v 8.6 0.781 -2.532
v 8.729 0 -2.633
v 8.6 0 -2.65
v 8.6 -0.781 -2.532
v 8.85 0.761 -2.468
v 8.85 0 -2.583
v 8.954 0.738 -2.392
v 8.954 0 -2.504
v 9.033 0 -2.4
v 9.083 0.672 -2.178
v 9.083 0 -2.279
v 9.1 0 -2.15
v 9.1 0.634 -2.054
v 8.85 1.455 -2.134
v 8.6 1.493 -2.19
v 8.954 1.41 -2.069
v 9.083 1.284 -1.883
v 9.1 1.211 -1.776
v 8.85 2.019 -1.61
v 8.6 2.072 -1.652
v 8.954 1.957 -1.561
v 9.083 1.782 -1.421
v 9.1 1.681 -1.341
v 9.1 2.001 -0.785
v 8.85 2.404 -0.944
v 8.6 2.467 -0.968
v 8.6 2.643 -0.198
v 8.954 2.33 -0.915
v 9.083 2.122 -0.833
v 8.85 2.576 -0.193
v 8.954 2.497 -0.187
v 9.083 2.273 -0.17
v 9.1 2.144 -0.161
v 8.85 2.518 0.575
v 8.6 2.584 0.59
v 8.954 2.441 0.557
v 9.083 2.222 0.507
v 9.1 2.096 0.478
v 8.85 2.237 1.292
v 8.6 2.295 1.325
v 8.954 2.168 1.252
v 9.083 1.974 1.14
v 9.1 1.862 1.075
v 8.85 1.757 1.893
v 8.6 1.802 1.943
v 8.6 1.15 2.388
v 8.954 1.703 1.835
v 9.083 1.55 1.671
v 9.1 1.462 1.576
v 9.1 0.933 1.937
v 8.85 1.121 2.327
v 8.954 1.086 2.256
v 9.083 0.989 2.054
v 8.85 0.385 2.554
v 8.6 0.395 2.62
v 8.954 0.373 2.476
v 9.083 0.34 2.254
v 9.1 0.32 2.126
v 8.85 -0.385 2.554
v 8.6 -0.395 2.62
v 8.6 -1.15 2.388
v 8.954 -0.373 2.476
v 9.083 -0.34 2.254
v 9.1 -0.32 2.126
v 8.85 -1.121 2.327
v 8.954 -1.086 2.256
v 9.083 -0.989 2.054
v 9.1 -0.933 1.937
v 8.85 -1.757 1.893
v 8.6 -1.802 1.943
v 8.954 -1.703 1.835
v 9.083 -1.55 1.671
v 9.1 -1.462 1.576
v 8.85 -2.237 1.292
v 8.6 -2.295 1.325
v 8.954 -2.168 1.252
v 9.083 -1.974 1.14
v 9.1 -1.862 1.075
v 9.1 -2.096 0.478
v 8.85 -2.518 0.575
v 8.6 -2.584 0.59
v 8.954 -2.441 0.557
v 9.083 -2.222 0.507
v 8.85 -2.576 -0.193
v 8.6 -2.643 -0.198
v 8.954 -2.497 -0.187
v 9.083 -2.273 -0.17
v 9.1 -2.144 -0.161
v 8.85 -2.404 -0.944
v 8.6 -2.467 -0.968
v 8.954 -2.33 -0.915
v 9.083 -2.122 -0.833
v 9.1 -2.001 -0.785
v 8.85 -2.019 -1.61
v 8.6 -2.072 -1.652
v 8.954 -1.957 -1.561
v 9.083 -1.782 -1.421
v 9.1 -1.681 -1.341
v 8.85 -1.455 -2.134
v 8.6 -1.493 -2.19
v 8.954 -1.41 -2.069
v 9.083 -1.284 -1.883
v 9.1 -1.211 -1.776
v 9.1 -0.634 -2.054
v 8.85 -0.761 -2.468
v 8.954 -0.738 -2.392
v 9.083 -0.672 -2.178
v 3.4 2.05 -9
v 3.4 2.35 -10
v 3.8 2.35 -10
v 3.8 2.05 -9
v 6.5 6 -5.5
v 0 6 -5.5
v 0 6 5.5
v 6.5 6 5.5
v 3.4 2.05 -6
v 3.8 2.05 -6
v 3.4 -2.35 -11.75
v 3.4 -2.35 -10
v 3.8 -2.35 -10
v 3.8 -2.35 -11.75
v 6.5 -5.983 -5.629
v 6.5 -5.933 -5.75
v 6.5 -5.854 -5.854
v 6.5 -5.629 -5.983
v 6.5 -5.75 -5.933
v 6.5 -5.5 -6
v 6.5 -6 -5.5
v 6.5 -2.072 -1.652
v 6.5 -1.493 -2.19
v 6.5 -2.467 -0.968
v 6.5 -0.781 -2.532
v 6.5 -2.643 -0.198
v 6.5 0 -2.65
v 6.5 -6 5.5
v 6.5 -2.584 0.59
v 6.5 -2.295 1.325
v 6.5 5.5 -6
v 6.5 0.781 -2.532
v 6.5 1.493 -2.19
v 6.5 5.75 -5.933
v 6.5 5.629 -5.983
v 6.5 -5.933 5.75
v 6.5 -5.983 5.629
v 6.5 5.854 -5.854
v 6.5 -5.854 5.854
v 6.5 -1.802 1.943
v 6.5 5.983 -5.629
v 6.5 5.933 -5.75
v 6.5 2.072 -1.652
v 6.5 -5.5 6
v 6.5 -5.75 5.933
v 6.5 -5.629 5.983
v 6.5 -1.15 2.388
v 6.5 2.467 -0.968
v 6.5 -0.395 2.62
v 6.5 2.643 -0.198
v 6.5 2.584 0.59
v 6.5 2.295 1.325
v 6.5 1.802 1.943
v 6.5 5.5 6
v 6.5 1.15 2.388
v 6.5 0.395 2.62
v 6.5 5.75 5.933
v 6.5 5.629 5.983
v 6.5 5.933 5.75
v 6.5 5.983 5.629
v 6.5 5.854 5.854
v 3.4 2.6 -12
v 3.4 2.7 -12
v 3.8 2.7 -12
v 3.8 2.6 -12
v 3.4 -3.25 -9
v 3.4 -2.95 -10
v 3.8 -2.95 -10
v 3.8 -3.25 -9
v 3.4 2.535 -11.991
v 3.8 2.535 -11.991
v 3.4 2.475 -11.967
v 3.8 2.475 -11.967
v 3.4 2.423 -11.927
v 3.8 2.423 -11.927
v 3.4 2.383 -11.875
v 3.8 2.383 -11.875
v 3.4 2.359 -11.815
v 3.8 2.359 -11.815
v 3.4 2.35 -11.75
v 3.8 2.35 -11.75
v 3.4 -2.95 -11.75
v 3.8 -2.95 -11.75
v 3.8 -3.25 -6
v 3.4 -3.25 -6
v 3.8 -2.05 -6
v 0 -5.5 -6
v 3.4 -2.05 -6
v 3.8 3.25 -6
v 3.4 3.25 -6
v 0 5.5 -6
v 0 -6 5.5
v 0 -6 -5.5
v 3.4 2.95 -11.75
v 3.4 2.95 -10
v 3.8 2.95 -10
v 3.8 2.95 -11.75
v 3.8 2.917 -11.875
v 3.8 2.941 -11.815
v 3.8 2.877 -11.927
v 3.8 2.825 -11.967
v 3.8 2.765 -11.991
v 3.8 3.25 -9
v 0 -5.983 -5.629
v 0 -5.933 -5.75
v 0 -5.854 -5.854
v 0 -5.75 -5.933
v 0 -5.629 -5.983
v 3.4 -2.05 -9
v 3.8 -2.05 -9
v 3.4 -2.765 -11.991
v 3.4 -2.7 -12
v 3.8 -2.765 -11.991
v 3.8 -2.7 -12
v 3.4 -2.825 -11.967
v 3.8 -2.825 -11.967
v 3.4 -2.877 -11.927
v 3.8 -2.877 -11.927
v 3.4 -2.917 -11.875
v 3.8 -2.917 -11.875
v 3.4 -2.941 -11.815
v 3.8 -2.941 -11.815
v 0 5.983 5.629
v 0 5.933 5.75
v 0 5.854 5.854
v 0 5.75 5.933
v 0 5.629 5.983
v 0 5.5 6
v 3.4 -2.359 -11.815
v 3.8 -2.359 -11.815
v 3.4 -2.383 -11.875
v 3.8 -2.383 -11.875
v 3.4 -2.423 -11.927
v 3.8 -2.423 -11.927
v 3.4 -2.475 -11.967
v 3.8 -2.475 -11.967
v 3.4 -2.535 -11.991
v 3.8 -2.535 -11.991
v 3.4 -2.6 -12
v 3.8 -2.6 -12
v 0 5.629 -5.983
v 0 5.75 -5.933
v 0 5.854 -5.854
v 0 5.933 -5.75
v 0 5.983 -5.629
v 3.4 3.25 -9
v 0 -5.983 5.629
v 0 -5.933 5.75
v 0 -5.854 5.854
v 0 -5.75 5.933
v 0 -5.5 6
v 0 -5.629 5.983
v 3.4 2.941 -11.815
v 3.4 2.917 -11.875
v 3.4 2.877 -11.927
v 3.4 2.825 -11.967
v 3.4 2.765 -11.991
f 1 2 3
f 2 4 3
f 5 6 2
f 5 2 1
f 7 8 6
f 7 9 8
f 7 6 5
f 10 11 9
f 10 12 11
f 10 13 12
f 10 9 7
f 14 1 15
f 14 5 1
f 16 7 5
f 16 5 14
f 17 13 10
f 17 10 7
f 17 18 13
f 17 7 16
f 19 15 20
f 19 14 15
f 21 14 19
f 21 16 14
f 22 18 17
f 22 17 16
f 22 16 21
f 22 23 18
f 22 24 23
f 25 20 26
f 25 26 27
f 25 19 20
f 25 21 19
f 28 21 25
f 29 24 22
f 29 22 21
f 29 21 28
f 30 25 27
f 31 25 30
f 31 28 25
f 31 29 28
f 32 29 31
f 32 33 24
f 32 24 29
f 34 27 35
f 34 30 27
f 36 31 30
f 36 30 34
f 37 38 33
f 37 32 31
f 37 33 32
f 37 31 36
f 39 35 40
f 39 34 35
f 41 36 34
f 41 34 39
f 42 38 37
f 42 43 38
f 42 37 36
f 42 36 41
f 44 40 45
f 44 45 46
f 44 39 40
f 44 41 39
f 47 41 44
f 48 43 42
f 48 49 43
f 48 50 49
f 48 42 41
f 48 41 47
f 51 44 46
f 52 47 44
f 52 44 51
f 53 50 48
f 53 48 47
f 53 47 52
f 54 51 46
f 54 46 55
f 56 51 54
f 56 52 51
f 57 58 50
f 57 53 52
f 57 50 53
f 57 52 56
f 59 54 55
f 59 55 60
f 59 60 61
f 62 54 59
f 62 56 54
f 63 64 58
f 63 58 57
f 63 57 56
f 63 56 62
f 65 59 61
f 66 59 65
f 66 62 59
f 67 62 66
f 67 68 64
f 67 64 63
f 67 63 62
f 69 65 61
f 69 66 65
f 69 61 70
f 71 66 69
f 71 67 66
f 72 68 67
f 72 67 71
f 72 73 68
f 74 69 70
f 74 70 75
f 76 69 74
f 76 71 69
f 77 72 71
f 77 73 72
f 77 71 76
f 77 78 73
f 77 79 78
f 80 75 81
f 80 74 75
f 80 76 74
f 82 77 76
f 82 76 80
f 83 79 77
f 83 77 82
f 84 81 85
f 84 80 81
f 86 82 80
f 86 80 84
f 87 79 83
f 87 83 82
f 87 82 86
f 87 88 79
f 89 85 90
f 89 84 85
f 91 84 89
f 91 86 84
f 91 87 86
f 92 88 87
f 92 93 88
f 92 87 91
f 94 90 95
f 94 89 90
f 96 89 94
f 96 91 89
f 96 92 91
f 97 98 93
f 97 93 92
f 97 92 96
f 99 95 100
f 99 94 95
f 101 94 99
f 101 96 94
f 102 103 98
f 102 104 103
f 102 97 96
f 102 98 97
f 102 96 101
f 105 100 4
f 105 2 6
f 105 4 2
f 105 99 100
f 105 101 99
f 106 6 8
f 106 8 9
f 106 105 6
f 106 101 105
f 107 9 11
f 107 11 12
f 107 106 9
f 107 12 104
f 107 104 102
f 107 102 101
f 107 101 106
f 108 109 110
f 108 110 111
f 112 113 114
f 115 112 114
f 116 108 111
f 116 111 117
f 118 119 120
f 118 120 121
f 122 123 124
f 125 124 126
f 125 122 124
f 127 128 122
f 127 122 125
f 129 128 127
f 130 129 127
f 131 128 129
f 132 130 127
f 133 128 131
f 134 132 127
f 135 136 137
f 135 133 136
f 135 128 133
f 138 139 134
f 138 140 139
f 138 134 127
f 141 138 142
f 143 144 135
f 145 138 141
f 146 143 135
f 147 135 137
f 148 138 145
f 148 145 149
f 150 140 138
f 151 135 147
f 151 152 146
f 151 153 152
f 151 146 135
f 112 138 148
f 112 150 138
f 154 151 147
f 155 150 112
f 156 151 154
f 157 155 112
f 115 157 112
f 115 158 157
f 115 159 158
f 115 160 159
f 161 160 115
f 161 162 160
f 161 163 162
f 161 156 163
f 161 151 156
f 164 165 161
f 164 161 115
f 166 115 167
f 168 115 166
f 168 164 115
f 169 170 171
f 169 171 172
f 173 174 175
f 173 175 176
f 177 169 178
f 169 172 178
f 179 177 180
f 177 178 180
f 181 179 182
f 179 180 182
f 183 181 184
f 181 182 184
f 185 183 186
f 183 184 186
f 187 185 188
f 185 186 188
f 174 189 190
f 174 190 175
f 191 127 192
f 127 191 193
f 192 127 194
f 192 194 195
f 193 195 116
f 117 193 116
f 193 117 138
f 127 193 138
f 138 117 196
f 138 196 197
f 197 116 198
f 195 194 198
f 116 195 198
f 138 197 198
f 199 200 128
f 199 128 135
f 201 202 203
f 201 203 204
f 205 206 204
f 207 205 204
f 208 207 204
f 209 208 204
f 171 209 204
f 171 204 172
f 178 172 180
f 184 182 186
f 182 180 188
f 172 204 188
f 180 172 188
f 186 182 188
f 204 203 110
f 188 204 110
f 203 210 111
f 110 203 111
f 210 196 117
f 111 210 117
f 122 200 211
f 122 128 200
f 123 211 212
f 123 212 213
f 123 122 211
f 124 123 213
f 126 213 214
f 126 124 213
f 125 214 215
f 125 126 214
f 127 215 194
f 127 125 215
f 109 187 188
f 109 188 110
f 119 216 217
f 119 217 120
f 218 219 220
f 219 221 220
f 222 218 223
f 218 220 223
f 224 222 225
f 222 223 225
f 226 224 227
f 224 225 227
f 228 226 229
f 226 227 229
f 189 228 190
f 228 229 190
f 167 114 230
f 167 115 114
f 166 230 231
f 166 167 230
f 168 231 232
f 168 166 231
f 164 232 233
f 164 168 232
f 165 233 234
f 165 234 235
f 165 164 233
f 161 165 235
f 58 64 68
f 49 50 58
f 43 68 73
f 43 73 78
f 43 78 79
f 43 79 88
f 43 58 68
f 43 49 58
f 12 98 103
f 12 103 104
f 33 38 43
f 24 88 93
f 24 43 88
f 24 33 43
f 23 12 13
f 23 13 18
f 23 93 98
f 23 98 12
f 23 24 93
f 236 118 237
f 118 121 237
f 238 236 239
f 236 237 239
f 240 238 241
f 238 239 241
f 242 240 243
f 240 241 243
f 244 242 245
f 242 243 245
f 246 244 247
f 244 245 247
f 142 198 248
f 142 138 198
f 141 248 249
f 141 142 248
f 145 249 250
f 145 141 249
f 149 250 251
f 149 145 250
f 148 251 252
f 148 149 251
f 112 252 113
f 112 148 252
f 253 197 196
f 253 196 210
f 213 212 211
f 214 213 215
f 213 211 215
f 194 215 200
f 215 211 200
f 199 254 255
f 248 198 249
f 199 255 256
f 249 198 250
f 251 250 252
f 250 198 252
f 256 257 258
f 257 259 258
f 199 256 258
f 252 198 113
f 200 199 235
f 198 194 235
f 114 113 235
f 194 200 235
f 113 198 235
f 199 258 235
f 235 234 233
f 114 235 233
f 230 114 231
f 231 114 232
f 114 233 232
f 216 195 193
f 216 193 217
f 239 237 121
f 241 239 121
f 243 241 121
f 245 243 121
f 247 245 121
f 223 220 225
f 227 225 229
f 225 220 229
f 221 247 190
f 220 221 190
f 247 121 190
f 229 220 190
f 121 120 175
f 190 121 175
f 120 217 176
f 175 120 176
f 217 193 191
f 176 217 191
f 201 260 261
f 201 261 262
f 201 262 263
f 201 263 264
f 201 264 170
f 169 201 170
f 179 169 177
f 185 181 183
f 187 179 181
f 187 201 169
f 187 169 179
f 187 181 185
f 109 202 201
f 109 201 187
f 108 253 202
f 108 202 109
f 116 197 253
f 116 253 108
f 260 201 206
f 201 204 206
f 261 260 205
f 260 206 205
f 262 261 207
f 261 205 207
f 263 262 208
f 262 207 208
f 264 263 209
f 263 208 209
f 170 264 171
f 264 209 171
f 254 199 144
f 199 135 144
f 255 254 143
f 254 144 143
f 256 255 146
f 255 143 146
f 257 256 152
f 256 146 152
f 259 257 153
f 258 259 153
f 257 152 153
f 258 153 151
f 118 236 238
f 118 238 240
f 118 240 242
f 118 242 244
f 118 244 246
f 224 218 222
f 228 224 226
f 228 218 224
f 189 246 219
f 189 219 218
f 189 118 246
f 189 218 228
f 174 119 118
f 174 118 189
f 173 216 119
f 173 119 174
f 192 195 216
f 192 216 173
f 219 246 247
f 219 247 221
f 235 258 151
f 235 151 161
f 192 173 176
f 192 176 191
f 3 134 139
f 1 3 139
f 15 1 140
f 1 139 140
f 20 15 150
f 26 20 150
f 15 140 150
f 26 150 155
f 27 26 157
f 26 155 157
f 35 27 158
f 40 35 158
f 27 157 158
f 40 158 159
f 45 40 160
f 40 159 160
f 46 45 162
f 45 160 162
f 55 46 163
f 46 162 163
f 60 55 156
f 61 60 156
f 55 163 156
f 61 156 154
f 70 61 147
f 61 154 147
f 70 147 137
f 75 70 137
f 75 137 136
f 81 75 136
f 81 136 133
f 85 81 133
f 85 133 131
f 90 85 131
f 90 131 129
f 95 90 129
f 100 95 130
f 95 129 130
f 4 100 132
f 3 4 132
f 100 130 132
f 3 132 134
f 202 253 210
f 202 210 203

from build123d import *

# Parameters (mm, degrees)
CYLINDER_R           = 2.65
CYLINDER_DEPTH       = 2.6
CYLINDER_PITCH_ANGLE = 90
FILLET001_R          = 0.5
PAD001_DEPTH         = 0.4
FILLET002_R          = 0.25
SKETCH_W             = 12
SKETCH_H             = 12
PAD_DEPTH            = 6.5
FILLET_R             = 0.5


with BuildPart() as fillet001:
    # Cylinder → Cylinder (new body)
    with BuildSketch(Plane.XY):
        Circle(CYLINDER_R)
    extrude(amount=CYLINDER_DEPTH)


with BuildPart() as fillet001_1:
    # Cylinder pitch: moved
    add(fillet001.part.rotate(Axis((0, 0, 0), (0, 1, 0)), CYLINDER_PITCH_ANGLE))


with BuildPart() as fillet001_2:
    # Cylinder placement: moved
    add(fillet001_1.part.moved(Location((6.5, 0, 0))))

    # Fillet001
    fillet001_edges = [fillet001_2.edges().sort_by_distance(p)[0] for p in [
        (9.1, 0, 2.65),
    ]]
    fillet(fillet001_edges, radius=FILLET001_R)


with BuildPart() as fillet002:
    # Sketch001 → Pad001 (new body)
    with BuildSketch(Plane.YZ.offset(3.4)):
        Polygon((-3.25, -6), (-2.05, -6), (-2.05, -9), (-2.35, -10), (-2.35, -12), (-2.95, -12), (-2.95, -10), (-3.25, -9), align=None)
        Polygon((2.05, -6), (3.25, -6), (3.25, -9), (2.95, -10), (2.95, -12), (2.35, -12), (2.35, -10), (2.05, -9), align=None)
    extrude(amount=PAD001_DEPTH)

    # Fillet002
    fillet002_edges = [fillet002.edges().sort_by_distance(p)[0] for p in [
        (3.6, 2.95, -12),
        (3.6, 2.35, -12),
        (3.6, -2.35, -12),
        (3.6, -2.95, -12),
    ]]
    fillet(fillet002_edges, radius=FILLET002_R)


with BuildPart() as fusion:
    # Sketch → Pad (new body)
    with BuildSketch(Plane.YZ):
        Rectangle(SKETCH_W, SKETCH_H)
    extrude(amount=PAD_DEPTH)

    # Fillet
    fillet_edges = [fusion.edges().sort_by_distance(p)[0] for p in [
        (3.25, 6, 6),
        (3.25, -6, 6),
        (3.25, -6, -6),
        (3.25, 6, -6),
    ]]
    fillet(fillet_edges, radius=FILLET_R)

    # Fusion: union Fillet001, Fillet002
    add(fillet001_2.part)
    add(fillet002.part)


solid = fusion.part
